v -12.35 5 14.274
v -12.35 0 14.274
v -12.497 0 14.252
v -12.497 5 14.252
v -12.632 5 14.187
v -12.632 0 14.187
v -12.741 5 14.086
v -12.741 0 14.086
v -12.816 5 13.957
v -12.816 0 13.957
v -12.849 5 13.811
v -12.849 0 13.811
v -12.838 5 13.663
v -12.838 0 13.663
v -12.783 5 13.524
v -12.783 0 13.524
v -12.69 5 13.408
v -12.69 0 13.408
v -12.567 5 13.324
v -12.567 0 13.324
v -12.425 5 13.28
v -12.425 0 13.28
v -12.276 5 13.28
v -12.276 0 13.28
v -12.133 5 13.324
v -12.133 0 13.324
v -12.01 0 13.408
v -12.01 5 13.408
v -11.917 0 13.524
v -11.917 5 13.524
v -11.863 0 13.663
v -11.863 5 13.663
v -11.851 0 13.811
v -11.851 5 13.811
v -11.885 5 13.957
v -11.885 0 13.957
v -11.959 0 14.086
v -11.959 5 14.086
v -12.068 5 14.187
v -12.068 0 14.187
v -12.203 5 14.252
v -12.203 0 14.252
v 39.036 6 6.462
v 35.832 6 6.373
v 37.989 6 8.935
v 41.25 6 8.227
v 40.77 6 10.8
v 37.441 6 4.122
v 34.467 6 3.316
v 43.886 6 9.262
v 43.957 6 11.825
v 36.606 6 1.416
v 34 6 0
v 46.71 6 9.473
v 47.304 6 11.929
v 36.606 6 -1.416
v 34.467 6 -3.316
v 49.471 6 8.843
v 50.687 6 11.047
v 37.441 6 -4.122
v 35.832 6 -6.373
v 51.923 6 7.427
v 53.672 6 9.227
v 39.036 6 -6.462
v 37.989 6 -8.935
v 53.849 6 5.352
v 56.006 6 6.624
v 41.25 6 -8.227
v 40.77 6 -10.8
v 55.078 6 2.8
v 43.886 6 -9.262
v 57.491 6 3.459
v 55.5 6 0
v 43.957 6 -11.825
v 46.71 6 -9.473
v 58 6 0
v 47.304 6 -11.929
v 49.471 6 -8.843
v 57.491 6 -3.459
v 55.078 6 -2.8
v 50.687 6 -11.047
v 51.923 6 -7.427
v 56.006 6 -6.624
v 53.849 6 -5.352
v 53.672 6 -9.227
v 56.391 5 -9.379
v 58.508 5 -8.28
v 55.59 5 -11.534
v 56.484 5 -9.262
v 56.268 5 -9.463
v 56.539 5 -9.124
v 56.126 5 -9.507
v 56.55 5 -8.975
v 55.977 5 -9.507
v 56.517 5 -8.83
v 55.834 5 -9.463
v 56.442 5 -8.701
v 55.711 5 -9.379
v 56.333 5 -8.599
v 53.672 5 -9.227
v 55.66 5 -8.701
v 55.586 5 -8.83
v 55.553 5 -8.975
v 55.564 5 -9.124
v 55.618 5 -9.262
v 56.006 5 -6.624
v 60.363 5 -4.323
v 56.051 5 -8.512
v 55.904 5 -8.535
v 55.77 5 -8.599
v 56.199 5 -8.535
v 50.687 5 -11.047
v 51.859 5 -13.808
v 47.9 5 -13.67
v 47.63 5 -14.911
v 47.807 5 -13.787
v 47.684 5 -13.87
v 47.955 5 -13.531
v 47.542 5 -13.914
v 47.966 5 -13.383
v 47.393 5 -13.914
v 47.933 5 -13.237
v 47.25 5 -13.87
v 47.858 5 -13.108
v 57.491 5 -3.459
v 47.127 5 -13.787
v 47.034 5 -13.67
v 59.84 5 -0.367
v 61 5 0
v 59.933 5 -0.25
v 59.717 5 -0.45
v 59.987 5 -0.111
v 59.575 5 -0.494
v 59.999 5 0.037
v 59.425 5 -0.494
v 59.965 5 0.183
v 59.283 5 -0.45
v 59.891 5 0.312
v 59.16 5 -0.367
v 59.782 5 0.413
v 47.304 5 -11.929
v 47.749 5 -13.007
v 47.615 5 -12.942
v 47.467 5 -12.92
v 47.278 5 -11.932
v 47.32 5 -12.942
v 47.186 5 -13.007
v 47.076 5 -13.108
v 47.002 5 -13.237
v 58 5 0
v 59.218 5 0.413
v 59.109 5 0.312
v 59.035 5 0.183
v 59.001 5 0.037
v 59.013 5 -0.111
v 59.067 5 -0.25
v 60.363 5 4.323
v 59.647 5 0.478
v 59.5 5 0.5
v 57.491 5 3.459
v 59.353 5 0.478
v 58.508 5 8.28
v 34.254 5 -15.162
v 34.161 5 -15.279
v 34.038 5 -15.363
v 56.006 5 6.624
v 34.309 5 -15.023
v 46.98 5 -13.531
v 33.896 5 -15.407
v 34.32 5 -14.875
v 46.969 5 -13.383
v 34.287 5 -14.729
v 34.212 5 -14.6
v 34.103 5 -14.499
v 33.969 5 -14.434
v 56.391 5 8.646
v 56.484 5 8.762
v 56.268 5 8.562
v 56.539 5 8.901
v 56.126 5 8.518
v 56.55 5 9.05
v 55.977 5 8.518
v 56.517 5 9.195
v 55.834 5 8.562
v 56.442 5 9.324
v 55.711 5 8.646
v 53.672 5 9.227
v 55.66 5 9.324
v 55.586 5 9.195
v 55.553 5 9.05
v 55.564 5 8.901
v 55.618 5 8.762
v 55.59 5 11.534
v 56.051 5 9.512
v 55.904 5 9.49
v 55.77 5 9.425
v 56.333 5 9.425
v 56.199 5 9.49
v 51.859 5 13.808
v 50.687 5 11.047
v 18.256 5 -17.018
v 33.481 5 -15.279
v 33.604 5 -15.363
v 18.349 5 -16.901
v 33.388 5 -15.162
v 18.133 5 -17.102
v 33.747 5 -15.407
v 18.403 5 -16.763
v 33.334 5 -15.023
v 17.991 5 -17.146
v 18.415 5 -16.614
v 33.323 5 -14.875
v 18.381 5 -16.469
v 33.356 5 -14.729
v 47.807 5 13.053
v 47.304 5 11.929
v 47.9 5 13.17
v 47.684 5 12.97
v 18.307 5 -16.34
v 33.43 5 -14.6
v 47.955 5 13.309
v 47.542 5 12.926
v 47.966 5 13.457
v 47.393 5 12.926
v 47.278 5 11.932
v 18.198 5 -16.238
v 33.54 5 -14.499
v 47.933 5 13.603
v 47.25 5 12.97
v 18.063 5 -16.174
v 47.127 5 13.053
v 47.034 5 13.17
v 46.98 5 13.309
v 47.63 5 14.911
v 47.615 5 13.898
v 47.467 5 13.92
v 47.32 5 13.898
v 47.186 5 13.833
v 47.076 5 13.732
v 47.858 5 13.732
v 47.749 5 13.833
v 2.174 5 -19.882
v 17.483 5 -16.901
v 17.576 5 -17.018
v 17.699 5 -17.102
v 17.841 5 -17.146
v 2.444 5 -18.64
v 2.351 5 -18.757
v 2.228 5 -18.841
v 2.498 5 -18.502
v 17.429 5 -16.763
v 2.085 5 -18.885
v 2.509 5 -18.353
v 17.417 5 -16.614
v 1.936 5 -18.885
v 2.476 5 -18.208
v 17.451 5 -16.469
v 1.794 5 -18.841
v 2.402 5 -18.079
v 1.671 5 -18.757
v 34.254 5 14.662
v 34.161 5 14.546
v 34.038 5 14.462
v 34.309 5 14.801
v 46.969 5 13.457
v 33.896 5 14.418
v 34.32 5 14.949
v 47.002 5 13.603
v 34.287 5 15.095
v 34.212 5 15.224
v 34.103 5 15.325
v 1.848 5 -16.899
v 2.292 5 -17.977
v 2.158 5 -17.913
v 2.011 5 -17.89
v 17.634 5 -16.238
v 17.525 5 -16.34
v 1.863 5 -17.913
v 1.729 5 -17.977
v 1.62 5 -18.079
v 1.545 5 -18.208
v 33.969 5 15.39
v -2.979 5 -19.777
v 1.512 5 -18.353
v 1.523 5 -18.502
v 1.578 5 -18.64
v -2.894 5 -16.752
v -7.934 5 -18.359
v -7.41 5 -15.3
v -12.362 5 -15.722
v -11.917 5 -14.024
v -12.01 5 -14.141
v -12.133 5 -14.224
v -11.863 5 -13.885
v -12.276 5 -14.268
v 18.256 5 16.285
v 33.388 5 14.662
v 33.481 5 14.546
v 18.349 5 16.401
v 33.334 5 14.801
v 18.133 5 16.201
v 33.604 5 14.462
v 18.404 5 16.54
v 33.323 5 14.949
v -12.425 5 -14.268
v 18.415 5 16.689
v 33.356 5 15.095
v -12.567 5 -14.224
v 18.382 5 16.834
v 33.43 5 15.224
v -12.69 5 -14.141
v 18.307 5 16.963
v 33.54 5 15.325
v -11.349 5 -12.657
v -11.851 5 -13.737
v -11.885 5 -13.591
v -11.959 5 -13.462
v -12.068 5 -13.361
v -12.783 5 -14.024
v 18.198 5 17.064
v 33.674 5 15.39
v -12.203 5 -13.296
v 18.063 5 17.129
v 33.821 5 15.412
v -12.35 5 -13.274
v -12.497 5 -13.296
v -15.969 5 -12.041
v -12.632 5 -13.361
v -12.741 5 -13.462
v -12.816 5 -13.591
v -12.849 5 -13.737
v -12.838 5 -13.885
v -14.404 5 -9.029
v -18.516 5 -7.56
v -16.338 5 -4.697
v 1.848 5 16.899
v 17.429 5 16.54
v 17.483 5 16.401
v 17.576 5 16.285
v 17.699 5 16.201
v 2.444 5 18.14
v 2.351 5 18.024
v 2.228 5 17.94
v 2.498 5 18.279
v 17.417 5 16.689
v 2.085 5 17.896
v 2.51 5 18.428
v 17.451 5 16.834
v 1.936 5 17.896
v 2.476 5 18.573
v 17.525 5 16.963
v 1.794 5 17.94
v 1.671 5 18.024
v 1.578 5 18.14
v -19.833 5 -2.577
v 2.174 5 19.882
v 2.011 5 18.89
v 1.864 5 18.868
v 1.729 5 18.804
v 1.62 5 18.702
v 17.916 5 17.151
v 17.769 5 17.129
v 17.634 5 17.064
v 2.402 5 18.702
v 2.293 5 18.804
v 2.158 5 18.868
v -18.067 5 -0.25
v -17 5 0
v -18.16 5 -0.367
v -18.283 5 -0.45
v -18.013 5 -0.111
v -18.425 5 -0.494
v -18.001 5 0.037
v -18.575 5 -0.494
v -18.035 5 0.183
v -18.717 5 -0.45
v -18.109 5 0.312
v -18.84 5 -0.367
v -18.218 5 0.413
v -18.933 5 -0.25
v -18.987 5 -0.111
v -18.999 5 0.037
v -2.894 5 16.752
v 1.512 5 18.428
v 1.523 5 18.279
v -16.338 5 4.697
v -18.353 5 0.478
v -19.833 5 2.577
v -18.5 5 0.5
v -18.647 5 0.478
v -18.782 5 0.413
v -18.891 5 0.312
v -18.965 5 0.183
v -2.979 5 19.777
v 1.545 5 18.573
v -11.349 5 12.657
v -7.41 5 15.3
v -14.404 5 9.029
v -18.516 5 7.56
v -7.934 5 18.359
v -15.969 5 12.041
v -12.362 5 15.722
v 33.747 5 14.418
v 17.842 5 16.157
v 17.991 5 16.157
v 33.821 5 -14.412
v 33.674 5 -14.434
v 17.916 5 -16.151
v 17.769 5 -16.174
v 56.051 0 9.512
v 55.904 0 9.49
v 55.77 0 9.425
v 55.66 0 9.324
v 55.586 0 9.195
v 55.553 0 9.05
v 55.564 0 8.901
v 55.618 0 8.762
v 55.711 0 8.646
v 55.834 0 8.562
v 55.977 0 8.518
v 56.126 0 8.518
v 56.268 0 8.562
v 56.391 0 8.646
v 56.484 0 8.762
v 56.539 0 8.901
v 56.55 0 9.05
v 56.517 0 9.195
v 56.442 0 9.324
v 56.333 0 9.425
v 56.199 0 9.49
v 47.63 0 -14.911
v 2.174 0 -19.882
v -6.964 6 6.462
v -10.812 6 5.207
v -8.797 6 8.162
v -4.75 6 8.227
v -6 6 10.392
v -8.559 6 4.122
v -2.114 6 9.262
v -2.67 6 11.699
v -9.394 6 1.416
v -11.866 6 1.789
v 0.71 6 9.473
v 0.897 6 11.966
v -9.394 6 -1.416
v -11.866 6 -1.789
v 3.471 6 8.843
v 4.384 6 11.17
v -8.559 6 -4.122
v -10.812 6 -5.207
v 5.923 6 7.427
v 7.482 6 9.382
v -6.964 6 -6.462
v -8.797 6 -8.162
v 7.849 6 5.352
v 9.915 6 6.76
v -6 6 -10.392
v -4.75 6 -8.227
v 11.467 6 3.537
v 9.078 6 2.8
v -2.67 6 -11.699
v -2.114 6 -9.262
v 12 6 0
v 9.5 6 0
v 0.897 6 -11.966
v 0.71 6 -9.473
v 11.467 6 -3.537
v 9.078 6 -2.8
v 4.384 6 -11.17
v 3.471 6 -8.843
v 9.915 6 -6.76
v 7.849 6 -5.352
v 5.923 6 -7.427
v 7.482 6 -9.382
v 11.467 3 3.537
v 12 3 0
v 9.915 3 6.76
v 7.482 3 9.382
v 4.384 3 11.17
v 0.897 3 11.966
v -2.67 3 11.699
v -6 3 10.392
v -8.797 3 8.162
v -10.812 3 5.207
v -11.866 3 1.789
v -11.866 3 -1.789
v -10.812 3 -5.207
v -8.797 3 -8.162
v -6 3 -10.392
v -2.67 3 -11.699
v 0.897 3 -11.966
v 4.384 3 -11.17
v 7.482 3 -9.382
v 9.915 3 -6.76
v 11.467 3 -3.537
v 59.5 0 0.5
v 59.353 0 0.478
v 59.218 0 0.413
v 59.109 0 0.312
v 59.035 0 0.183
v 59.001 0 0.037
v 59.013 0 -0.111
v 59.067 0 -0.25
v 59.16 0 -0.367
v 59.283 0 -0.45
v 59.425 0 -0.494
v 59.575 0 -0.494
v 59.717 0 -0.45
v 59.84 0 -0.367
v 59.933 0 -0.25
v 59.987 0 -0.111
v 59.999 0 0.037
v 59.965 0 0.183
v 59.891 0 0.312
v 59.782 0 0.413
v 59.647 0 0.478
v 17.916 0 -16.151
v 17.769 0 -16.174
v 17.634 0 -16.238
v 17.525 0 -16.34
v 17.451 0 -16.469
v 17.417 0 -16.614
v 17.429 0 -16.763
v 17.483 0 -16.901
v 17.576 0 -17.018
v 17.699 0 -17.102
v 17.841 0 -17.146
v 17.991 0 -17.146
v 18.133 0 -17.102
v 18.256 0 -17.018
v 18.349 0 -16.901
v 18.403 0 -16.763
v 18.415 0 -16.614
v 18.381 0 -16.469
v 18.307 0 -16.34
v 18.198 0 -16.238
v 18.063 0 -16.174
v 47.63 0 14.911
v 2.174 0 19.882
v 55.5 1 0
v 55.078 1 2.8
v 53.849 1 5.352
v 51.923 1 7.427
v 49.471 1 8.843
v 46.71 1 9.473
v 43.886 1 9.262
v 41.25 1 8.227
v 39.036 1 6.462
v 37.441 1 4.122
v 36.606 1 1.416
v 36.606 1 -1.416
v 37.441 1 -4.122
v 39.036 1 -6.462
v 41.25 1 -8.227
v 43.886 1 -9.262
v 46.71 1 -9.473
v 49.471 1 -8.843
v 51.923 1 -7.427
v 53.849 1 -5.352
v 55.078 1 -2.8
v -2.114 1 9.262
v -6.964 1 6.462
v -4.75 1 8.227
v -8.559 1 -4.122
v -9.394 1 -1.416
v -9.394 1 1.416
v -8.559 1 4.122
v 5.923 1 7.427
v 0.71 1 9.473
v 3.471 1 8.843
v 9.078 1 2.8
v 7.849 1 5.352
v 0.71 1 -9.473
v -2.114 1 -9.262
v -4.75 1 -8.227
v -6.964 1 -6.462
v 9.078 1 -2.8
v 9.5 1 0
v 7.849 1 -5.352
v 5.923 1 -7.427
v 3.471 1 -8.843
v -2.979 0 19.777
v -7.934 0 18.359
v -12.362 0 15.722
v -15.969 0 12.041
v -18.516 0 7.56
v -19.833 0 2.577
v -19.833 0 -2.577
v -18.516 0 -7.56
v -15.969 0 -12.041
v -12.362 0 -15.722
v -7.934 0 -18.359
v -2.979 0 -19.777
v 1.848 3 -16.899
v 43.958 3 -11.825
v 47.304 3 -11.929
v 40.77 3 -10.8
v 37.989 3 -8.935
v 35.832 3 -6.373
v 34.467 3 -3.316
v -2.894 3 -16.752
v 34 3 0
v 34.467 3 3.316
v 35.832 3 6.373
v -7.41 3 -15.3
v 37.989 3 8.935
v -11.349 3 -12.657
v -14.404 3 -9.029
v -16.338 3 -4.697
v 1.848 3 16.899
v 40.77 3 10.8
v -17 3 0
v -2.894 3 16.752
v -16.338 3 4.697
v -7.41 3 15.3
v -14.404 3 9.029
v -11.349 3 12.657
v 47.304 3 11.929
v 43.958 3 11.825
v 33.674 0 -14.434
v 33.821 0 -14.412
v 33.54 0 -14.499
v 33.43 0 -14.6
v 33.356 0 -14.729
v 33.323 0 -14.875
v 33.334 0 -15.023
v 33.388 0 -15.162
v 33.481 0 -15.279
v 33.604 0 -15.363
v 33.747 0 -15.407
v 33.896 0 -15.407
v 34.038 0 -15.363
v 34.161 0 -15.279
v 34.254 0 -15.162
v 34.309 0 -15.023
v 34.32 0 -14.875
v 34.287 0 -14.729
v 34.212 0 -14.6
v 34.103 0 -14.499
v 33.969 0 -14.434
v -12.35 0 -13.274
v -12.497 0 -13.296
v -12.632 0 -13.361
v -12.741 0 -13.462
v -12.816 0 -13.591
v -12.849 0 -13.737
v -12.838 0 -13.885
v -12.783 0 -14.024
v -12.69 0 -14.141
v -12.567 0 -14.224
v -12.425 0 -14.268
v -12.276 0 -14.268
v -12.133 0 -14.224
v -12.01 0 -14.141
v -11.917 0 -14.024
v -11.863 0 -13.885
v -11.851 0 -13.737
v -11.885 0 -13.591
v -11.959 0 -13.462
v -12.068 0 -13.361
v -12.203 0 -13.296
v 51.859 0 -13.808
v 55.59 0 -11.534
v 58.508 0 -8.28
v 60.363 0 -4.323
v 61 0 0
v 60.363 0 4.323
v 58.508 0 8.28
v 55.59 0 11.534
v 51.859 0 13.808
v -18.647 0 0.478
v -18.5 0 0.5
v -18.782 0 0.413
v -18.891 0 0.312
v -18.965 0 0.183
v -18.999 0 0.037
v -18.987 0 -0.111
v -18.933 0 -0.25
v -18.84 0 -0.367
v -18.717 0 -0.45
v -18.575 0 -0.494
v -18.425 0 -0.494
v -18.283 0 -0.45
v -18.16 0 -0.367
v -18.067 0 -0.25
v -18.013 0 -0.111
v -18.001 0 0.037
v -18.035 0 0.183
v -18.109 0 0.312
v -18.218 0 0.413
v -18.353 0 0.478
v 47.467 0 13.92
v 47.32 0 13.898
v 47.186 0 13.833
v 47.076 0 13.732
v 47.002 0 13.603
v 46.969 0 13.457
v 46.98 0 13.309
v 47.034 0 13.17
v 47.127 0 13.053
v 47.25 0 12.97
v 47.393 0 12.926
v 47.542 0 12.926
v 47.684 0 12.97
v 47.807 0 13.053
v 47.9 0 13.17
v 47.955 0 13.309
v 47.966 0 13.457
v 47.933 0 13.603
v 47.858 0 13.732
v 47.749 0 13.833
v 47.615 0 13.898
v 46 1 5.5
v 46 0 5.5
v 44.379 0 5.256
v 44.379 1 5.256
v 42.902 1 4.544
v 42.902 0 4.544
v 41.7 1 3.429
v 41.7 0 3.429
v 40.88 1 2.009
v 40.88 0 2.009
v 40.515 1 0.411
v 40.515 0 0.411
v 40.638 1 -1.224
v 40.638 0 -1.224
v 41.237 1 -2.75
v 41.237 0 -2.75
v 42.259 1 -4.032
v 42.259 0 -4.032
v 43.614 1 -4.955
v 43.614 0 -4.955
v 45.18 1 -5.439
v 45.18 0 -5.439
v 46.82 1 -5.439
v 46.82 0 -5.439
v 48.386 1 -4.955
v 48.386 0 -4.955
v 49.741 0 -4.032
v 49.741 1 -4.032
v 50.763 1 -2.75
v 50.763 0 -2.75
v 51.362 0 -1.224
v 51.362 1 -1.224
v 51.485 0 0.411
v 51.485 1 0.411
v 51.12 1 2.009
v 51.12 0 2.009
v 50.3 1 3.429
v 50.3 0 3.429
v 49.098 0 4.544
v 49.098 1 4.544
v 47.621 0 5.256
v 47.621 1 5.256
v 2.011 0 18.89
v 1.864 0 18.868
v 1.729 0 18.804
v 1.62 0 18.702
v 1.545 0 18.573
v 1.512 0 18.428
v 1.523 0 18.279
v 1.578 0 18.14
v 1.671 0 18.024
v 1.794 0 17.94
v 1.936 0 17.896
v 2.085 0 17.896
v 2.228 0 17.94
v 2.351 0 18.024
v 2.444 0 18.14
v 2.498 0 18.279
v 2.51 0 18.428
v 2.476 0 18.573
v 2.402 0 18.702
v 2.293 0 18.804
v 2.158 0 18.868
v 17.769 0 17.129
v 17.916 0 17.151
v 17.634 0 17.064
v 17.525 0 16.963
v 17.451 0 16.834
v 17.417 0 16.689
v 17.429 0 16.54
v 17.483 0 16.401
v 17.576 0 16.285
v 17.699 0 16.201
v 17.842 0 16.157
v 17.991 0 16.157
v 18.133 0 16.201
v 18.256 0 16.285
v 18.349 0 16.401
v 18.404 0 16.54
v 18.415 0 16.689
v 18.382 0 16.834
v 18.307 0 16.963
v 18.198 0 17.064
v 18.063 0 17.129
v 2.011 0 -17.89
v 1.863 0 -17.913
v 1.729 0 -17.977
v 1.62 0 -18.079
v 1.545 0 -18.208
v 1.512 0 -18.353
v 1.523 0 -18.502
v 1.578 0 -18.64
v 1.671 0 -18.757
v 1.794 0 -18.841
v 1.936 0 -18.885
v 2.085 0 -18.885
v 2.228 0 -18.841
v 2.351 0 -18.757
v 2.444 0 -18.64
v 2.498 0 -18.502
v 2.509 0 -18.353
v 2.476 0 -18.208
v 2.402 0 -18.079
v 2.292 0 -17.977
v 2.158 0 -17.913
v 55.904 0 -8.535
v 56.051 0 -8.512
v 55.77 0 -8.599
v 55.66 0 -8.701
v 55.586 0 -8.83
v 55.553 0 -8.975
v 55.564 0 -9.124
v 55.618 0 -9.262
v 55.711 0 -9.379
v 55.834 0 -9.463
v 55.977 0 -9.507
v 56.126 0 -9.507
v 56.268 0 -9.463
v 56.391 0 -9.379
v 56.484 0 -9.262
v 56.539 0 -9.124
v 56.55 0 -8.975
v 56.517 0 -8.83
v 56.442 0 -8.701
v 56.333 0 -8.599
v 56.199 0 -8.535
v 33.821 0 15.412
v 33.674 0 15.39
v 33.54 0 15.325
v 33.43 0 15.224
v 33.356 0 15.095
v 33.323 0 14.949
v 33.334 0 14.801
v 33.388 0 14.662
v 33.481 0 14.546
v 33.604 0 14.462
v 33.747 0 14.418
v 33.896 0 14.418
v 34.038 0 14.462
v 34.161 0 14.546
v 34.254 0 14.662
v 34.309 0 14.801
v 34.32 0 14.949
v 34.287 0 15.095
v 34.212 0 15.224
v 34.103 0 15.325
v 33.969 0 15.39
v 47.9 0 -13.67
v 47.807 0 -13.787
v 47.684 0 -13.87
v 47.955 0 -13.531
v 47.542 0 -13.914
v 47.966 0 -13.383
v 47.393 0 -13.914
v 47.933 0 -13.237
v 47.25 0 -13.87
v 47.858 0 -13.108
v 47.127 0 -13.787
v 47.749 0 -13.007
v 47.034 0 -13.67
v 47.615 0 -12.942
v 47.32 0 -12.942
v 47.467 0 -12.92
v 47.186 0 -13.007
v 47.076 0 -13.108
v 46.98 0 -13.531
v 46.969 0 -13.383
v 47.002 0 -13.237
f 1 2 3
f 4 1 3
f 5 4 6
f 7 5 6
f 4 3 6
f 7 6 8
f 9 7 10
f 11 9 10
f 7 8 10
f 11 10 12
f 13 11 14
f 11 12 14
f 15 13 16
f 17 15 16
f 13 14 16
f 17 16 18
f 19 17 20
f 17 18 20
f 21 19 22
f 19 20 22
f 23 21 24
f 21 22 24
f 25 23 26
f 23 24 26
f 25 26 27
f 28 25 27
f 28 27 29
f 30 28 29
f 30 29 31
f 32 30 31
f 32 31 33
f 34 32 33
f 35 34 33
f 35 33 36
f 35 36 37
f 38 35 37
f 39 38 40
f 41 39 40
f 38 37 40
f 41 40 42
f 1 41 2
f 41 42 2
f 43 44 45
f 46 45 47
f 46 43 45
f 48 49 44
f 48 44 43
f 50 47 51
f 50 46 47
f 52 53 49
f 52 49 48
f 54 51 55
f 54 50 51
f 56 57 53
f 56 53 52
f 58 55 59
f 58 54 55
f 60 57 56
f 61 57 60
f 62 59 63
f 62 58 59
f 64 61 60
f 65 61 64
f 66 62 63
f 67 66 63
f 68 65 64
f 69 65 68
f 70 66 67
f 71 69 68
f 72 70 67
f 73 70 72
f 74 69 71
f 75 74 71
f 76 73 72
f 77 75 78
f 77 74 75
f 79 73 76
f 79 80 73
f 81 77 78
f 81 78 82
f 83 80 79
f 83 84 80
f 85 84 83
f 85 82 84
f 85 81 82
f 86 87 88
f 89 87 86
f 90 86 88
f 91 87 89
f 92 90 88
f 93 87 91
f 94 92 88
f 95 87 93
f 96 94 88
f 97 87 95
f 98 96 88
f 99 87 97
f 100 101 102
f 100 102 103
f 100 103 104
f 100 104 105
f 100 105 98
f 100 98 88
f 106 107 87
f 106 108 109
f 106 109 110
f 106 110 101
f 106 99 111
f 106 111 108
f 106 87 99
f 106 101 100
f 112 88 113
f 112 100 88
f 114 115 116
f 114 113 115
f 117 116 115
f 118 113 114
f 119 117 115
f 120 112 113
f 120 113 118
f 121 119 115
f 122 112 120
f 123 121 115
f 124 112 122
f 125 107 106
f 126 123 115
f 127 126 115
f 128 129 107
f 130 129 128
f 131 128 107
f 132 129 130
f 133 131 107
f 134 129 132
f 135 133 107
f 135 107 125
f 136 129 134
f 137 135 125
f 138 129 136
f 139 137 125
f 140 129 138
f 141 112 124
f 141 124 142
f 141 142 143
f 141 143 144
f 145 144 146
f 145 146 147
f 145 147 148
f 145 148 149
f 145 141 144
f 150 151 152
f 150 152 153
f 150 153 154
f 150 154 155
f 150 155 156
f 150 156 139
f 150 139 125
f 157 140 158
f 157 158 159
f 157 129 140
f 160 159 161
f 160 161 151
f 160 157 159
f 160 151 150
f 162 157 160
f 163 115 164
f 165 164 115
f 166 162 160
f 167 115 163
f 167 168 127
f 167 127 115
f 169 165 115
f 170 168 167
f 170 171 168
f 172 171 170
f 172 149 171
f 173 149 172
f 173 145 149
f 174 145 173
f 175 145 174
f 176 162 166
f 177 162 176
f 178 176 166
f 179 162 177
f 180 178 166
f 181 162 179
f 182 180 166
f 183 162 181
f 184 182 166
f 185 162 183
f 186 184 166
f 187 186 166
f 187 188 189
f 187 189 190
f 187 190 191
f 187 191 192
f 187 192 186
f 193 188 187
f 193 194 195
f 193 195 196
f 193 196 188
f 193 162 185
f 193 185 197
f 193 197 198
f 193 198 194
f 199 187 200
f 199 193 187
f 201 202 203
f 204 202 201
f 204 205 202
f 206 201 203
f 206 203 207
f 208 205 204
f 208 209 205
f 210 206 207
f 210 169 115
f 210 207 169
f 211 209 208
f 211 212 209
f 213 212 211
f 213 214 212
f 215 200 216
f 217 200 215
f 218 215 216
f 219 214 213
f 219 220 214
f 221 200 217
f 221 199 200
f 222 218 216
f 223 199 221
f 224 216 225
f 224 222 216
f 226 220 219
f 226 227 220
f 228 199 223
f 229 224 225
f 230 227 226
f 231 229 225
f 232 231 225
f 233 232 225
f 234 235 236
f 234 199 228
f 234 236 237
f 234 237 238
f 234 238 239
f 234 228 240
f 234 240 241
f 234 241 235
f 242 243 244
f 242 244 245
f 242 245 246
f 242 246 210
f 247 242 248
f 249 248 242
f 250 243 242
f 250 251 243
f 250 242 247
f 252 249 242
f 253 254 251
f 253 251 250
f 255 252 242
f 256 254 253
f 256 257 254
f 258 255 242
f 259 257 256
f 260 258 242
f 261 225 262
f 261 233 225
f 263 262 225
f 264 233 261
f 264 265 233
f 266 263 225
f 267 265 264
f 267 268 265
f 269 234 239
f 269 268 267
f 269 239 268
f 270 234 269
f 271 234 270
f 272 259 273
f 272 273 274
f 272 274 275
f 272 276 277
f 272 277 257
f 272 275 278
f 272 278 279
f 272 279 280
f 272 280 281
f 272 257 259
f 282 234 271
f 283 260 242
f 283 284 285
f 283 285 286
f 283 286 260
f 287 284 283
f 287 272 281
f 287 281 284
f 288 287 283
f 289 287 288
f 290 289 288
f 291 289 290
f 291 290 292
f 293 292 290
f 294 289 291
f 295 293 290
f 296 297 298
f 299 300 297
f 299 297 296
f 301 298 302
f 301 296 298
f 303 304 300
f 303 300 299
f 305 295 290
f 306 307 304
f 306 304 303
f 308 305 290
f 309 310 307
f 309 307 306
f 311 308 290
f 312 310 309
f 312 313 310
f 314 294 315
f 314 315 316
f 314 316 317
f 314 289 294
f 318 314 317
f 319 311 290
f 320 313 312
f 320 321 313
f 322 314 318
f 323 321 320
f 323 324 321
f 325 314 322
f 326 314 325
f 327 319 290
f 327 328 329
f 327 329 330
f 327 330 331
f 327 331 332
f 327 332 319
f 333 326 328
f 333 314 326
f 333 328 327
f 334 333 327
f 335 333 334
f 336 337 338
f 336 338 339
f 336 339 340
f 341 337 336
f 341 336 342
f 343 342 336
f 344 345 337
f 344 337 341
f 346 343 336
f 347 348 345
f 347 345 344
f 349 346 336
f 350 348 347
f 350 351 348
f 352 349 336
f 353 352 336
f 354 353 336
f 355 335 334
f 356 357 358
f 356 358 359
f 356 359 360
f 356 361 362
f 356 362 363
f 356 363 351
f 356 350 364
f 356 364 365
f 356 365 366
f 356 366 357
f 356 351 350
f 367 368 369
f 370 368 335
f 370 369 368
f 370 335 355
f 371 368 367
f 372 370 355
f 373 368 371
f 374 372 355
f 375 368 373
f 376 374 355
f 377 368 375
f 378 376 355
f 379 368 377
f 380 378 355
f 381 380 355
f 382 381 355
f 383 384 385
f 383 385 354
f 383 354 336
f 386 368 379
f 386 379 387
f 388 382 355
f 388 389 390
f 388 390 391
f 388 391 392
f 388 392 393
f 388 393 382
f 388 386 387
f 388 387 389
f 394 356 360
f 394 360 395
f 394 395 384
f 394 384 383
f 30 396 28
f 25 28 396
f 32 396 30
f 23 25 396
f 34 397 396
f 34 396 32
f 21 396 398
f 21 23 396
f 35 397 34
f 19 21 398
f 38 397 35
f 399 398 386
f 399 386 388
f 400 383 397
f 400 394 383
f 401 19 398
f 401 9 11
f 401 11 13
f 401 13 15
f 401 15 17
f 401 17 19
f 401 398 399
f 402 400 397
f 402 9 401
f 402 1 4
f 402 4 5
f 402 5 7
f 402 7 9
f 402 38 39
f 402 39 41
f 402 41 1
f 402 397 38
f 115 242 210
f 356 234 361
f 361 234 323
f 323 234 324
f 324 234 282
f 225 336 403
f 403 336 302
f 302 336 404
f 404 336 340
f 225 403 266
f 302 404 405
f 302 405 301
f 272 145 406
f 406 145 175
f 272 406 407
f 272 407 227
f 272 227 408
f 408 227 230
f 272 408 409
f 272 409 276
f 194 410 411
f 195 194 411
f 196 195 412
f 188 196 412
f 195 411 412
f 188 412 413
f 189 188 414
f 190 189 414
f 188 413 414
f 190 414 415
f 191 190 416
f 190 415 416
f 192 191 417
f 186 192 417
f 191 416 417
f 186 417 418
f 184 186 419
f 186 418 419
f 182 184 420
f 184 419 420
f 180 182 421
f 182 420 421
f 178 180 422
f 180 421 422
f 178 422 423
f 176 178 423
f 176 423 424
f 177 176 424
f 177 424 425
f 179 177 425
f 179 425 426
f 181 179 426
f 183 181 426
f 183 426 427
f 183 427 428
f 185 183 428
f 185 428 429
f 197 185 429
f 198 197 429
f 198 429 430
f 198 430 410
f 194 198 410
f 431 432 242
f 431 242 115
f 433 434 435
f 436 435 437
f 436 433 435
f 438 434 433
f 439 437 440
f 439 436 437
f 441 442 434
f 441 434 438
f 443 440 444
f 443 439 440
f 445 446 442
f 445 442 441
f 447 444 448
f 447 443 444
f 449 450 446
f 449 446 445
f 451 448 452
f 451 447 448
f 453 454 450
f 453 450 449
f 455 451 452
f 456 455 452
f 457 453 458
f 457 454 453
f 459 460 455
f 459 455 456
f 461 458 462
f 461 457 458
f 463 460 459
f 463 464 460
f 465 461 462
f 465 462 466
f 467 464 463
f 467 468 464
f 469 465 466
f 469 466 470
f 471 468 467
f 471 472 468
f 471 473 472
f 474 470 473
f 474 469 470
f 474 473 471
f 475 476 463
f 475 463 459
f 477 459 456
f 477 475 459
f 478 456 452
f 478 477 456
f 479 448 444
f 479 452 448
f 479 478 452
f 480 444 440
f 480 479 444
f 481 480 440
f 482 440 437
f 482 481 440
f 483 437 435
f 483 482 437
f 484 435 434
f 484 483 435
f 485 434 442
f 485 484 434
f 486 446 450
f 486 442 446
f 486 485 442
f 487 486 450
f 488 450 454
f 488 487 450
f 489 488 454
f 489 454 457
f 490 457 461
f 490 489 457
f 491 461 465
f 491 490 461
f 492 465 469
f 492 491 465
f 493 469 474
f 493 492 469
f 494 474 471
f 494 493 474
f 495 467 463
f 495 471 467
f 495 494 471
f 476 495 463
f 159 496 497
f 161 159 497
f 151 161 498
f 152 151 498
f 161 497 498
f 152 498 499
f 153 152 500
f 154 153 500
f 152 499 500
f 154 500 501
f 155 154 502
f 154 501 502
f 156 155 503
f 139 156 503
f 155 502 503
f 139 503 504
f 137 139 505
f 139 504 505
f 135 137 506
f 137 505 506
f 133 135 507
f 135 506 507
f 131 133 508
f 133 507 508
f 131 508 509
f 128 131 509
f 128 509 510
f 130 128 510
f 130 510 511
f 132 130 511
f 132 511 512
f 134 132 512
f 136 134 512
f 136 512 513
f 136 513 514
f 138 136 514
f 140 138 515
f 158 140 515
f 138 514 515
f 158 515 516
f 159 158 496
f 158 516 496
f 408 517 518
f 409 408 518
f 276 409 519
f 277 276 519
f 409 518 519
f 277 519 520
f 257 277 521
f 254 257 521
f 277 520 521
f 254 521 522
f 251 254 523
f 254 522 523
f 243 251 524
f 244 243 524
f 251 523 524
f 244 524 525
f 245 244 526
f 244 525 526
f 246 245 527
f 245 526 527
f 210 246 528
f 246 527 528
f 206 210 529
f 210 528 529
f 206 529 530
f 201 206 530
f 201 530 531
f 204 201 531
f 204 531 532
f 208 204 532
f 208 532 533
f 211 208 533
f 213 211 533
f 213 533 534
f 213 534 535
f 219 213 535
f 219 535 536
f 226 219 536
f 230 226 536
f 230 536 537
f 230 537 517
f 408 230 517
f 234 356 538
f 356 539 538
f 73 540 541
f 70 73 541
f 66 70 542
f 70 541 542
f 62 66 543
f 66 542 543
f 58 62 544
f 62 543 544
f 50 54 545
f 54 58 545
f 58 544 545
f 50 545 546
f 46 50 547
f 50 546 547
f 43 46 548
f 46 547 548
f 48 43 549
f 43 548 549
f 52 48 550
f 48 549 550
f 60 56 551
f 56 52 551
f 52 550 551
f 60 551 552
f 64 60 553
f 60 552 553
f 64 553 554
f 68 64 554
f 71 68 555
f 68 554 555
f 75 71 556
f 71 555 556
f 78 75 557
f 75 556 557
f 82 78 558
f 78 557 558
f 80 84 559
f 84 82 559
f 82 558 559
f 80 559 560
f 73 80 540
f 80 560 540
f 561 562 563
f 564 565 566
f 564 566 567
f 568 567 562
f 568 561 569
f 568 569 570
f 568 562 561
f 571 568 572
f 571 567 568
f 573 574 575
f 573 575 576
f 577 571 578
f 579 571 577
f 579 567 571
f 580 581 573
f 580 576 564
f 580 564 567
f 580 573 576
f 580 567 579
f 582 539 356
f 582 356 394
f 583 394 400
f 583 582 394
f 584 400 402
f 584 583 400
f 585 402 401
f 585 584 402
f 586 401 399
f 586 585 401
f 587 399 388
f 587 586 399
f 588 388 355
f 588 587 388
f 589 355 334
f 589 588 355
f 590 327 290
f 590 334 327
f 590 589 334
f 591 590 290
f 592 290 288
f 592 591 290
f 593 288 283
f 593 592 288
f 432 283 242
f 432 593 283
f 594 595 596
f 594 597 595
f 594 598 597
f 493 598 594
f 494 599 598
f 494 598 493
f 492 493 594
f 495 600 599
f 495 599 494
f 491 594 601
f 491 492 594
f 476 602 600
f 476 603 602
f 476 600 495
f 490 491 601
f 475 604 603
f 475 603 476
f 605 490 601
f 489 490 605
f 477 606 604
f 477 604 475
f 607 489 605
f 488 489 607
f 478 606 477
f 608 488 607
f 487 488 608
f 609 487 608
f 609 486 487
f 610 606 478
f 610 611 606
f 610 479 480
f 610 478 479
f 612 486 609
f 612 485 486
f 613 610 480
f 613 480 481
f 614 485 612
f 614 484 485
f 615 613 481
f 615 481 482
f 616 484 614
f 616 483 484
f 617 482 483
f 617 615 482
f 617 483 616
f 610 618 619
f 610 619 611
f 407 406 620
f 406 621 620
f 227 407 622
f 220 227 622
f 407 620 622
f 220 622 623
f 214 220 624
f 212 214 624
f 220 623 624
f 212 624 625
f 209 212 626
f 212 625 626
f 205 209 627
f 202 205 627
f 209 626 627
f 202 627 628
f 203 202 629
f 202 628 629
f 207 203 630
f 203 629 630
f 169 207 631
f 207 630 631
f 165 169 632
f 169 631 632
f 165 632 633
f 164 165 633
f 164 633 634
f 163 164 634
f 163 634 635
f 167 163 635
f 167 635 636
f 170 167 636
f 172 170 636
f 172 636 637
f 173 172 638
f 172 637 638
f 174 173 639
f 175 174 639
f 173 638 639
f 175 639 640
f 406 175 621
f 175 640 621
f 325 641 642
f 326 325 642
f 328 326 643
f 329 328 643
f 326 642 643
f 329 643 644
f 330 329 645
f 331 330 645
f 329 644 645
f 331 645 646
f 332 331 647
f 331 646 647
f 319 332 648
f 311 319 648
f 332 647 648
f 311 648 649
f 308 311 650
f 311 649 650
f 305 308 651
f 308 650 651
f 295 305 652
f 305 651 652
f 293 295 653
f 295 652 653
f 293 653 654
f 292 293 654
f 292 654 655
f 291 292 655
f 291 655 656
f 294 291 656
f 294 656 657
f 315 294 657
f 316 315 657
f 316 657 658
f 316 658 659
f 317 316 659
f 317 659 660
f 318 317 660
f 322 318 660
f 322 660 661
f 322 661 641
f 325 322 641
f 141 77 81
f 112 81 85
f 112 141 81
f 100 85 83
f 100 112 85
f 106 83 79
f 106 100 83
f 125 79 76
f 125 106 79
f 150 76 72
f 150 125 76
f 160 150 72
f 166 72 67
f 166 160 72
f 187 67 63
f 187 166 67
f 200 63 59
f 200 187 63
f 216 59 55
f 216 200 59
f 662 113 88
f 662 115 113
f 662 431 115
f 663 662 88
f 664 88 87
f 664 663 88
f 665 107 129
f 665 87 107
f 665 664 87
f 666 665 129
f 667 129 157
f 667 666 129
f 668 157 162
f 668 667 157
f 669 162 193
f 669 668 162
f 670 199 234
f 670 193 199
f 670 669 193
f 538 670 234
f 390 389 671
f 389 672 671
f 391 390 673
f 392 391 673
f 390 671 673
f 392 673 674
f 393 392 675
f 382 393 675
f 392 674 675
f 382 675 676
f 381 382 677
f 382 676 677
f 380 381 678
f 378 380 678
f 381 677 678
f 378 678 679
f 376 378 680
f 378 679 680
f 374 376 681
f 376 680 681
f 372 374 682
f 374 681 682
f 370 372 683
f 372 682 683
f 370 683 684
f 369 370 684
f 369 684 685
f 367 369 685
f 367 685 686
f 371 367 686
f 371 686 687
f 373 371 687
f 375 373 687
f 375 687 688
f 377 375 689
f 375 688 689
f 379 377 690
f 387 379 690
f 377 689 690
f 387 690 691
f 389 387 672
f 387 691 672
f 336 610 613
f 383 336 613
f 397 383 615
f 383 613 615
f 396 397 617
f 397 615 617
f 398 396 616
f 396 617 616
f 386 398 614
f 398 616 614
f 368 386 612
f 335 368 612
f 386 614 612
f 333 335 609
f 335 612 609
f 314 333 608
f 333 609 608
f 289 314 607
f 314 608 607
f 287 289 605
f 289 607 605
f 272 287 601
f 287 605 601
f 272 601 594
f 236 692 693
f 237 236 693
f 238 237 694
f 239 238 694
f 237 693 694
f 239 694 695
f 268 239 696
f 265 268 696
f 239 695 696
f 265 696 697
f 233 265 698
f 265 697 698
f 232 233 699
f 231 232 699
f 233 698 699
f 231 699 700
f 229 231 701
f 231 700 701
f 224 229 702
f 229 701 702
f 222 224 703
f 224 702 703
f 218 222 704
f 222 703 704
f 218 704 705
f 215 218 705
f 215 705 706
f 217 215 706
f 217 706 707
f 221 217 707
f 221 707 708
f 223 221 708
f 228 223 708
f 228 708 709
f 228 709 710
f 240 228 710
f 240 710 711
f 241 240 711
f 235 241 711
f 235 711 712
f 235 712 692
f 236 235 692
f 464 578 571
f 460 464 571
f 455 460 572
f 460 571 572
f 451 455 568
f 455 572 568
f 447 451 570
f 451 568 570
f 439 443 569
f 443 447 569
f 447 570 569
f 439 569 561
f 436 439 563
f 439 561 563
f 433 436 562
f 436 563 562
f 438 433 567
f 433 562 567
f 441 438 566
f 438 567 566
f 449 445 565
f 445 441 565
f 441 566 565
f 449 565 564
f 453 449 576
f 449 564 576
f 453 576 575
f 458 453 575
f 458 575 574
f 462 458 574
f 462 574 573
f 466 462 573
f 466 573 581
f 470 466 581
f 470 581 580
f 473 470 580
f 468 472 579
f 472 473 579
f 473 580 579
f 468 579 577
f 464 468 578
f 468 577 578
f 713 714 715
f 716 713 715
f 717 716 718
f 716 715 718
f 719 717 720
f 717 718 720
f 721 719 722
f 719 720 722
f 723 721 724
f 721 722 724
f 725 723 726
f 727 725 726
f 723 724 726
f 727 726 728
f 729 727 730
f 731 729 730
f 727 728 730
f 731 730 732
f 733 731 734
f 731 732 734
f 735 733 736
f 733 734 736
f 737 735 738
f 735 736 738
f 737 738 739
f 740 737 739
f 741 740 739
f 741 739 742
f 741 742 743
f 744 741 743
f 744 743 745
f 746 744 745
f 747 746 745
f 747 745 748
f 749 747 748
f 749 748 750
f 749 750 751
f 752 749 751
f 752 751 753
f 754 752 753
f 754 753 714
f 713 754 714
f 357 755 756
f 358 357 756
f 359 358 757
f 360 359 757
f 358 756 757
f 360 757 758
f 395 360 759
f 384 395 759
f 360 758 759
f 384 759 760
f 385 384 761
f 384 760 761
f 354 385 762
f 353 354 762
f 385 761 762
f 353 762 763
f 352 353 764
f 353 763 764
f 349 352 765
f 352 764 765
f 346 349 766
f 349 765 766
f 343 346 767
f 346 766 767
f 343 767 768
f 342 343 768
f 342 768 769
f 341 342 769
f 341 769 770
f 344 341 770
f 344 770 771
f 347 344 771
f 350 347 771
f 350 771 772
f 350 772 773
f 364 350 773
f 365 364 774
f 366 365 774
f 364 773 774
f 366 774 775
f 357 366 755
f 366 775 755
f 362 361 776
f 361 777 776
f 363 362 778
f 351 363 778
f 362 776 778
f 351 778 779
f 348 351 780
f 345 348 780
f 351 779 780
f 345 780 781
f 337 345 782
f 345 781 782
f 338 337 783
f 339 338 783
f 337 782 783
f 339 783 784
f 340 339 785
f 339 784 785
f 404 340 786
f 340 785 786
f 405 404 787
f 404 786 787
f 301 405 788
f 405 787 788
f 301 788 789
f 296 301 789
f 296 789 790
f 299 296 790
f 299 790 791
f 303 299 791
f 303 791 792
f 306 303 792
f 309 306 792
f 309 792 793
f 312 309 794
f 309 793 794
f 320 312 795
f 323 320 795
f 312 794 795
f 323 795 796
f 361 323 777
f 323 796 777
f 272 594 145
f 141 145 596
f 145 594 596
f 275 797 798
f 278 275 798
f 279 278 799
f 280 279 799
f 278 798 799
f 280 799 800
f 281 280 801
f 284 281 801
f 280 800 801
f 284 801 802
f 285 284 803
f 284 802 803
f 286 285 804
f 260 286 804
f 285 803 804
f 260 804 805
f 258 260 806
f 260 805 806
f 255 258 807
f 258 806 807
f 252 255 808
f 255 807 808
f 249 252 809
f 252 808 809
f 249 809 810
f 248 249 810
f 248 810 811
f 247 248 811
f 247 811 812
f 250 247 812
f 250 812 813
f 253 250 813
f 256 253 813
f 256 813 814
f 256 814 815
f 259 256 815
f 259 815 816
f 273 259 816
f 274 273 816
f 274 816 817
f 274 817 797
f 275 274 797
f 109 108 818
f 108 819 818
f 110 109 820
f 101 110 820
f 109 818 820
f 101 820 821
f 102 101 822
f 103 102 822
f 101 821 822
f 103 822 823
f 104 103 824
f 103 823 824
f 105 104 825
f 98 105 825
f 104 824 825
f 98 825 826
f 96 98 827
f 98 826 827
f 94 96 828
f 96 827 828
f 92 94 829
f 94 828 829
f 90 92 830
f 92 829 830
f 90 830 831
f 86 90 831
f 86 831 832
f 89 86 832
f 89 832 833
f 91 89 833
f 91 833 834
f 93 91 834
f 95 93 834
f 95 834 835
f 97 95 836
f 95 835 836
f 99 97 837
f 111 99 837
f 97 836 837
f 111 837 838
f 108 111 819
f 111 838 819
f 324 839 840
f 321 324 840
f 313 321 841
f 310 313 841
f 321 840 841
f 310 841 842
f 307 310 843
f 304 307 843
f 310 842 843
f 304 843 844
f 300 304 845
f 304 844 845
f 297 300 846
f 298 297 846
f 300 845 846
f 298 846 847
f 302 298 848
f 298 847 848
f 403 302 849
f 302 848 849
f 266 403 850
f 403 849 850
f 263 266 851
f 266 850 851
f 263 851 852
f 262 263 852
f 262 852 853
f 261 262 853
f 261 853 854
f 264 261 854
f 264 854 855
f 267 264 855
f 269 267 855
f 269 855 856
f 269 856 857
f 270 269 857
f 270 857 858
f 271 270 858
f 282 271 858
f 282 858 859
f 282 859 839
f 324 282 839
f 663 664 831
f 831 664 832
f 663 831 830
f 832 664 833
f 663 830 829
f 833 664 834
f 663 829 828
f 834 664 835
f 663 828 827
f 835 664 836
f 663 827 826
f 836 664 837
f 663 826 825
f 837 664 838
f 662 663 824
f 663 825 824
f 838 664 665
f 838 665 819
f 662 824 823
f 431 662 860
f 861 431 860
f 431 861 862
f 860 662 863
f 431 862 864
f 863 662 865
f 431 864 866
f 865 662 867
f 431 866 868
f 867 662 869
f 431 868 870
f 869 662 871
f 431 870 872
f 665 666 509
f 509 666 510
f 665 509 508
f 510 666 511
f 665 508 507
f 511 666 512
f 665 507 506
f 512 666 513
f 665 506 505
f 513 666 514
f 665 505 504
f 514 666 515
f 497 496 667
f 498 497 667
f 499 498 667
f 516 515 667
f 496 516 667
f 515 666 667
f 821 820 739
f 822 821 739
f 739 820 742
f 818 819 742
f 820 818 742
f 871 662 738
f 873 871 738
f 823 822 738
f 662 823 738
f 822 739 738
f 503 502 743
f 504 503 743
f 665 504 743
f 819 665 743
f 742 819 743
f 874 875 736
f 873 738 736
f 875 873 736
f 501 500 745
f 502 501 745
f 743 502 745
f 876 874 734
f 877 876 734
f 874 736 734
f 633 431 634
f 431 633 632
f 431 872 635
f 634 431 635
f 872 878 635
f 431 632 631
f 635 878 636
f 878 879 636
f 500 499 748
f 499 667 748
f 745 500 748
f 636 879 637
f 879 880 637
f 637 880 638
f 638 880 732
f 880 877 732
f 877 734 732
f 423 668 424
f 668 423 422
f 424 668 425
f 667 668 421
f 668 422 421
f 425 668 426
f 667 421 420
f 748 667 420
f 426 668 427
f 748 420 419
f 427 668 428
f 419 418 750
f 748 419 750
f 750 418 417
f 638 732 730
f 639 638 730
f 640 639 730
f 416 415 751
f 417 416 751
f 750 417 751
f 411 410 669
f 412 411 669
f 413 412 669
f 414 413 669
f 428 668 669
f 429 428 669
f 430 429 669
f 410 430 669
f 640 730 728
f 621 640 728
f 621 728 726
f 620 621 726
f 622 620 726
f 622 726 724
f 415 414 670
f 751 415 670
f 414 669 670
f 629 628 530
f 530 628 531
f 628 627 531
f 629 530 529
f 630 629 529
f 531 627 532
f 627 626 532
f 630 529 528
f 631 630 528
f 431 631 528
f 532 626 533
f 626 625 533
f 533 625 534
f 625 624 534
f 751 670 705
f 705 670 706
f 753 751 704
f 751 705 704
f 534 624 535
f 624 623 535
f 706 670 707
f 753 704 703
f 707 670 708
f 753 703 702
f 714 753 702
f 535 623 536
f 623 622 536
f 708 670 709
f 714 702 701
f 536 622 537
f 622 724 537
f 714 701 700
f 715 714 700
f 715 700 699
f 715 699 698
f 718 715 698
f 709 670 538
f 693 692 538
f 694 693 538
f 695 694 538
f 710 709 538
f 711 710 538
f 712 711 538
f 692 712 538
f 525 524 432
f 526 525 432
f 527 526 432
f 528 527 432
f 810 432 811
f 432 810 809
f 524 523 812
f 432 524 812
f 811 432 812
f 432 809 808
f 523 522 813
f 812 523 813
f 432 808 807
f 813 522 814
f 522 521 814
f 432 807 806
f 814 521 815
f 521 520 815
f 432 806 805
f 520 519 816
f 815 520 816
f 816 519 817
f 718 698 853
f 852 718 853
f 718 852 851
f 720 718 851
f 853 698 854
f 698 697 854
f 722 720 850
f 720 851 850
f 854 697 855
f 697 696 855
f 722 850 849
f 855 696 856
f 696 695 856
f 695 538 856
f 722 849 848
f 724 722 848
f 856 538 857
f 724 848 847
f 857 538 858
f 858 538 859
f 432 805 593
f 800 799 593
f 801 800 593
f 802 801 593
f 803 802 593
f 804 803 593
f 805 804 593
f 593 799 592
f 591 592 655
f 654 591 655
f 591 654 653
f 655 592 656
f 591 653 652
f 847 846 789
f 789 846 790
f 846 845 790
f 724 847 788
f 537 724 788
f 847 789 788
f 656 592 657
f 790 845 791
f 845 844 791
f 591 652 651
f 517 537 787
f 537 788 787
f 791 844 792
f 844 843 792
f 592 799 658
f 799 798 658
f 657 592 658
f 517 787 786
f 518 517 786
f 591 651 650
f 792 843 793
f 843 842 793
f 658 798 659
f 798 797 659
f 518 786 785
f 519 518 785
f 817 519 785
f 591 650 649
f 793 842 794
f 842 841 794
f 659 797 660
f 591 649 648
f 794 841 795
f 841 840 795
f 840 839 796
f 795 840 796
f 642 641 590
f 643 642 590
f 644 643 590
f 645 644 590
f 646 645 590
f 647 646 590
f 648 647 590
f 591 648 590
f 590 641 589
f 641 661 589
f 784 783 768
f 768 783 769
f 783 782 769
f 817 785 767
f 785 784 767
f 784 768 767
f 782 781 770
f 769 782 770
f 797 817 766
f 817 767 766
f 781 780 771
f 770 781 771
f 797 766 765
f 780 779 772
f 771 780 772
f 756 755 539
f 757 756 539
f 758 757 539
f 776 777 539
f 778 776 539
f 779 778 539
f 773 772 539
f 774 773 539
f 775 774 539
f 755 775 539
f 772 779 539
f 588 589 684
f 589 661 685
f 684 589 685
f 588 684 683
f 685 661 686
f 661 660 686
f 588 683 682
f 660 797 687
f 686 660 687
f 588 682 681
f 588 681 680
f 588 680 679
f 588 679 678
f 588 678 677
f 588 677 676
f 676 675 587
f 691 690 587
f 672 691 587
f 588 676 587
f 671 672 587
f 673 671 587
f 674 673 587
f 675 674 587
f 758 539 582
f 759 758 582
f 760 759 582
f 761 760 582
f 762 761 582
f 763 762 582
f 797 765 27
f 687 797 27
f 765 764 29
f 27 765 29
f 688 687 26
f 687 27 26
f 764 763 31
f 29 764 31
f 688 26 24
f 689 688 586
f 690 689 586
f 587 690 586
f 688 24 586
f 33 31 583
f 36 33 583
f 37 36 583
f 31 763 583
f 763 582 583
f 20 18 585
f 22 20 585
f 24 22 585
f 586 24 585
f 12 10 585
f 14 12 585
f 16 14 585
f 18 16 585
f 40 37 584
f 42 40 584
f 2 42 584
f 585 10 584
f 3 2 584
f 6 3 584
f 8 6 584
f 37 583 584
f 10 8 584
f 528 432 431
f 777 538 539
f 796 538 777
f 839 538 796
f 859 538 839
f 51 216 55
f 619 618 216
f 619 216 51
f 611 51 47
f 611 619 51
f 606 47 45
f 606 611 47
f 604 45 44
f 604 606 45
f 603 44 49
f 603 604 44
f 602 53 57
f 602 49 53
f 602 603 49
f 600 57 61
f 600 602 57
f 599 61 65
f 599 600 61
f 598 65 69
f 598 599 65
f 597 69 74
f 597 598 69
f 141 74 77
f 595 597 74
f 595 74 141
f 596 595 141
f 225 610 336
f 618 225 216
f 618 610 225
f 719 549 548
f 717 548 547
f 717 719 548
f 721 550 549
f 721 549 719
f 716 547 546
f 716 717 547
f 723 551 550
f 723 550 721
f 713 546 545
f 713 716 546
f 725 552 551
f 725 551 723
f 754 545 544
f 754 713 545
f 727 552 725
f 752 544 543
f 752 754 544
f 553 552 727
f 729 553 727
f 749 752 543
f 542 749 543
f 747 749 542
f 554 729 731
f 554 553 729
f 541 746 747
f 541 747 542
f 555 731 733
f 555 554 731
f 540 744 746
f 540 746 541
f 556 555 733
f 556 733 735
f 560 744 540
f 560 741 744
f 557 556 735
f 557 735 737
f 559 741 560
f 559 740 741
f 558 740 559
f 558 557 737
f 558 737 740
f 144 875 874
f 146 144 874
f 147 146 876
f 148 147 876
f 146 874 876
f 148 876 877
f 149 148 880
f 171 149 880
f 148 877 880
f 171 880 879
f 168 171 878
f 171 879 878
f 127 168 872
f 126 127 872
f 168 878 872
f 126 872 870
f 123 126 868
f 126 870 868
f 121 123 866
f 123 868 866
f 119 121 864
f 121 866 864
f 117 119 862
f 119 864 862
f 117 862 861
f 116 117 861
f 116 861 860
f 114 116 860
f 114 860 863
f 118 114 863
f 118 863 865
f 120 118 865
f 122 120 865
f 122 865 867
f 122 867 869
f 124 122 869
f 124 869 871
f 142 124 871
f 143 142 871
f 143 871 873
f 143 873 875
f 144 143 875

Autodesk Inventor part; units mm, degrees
ref_plane "YZ Plane" through (0, 0, 0) normal (1, 0, 0) x (0, 1, 0)
ref_plane "XZ Plane" through (0, 0, 0) normal (0, 1, 0) x (-1, 0, 0)
ref_plane "XY Plane" through (0, 0, 0) normal (0, 0, 1) x (1, 0, 0)
sketch "Skizze7" plane through (0, 0, 0) normal (0, -1, 0) x (1, 0, 0)
  point P0 (-1.8443, 26.478)
sketch "Skizze1" plane through (0, 0, 0) normal (0, 1, 0) x (-1, 0, 0)
  arc A0 (-2.1739, -19.8815) -> (-2.1739, 19.8815) centre (0, 0) ccw
  arc A1 (-47.6304, 14.9111) -> (-47.6304, -14.9111) centre (-46, 0) ccw
  line L0 (-2.1739, 19.8815) -> (-47.6304, 14.9111)
  line L1 (-2.1739, -19.8815) -> (-47.6304, -14.9111)
  line L2 (45.0235, 0) -> (-115.148, 0) construction
  dimension "d0" = 40
  dimension "d1" = 30
  dimension "d2" = 46
extrude "Extrusion1" add sketch "Skizze1" along normal blind 5
shell "Wandung1" thickness 3 removed faces 1 at (17.3261, 5, -4.9704)
sketch "Skizze2" plane through (0, 3, 0) normal (0, 1, 0) x (1, 0, 0)
  circle A0 centre (0, 0) radius 9.5
  circle A1 centre (0, 0) radius 12
  dimension "d6" = 19
  dimension "d7" = 24
extrude "Extrusion2" add sketch "Skizze2" along normal blind 3
sketch "Skizze3" plane through (0, 3, 0) normal (0, 1, 0) x (1, 0, 0)
  arc A0 (47.3043, -11.9289) -> (47.3043, 11.9289) centre (46, 0) ccw projected
  circle A1 centre (46, 0) radius 9.5
  circle A2 centre (46, 0) radius 12
  point P0 (0, 0)
  point P1 (47.3043, -11.9289)
  dimension "d10" = 19
extrude "Extrusion3" add sketch "Skizze3" along normal blind 3
sketch "Skizze4" plane through (0, 3, 0) normal (0, 1, 0) x (1, 0, 0)
  circle A0 centre (0, 0) radius 9.5
extrude "Extrusion4" cut sketch "Skizze4" against normal blind 2
sketch "Skizze5" plane through (46, 3, 0) normal (0, 1, 0) x (1, 0, 0)
  circle A0 centre (0, 0) radius 9.5
  point P0 (-46, 0)
extrude "Extrusion5" cut sketch "Skizze5" against normal blind 2
sketch "Skizze6" plane through (46, 1, 0) normal (0, 1, 0) x (1, 0, 0)
  point P0 (-46, 0)
  point P1 (0, 0)
  point P2 (0, 0)
hole "Bohrung1" at (46, 1, 0) direction (0, -1, 0) diameter 11 end through all
sketch "Skizze8" plane through (0, 5, 0) normal (0, 1, 0) x (1, 0, 0)
  arc A0 (1.8478, 16.8993) -> (1.8478, -16.8993) centre (0, 0) ccw projected
  arc A1 (2.1739, 19.8815) -> (2.1739, -19.8815) centre (0, 0) ccw projected
  line L0 (47.3043, -11.9289) -> (1.8478, -16.8993) projected
  line L1 (2.1739, -19.8815) -> (47.6304, -14.9111) projected
  arc A2 (47.6304, -14.9111) -> (47.6304, 14.9111) centre (46, 0) ccw projected
  circle A3 centre (46, 0) radius 12 projected
  line L2 (1.8478, 16.8993) -> (47.3043, 11.9289) projected
  line L3 (47.6304, 14.9111) -> (2.1739, 19.8815) projected
  arc A4 (2.0109, 18.3904) -> (2.0109, -18.3904) centre (0, 0) ccw
  line L4 (2.0109, 18.3904) -> (47.4674, 13.42)
  arc A5 (47.4674, -13.42) -> (47.4674, 13.42) centre (46, 0) ccw
  line L5 (47.4674, -13.42) -> (2.0109, -18.3904)
  line L6 (47.4674, 13.42) -> (46, 0) construction
  line L7 (46, 0) -> (47.4674, -13.42) construction
  line L8 (0, 0) -> (2.0109, -18.3904) construction
  line L9 (0, 0) -> (2.0109, 18.3904) construction
  point P0 (0, -18.5)
  point P1 (56.0514, -9.0122)
  point P2 (59.5, 0)
  point P3 (56.0513, 9.0123)
  point P4 (47.4673, 13.42)
  point P5 (-12.3501, -13.7741)
  point P6 (-18.5, 0)
  point P7 (-12.3501, 13.774)
  point P8 (2.0108, 18.3904)
  point P9 (17.9161, -16.6513)
  point P10 (33.8213, -14.9121)
  point P11 (17.9161, 16.6513)
  point P12 (17.916, 16.6513)
  point P13 (33.8213, 14.9121)
  point P14 (33.8212, 14.9121)
  dimension "d24" = 1.5
  dimension "d26" = 167.52
  dimension "d29" = 167.52
  dimension "d31" = 167.52
  dimension "d34" = 192.48
  dimension "d38" = 16
  dimension "d45" = 16
hole "Bohrung2" at (2.0109, 5, 18.3904) at (-12.3501, 5, 13.7741) at (-18.5, 5, 0) at (-12.3501, 5, -13.774) at (2.0108, 5, -18.3904) at (17.916, 5, -16.6513) at (33.8213, 5, -14.9121) at (47.4673, 5, -13.42) at (56.0513, 5, -9.0123) at (59.5, 5, 0) at (56.0514, 5, 9.0122) at (47.4674, 5, 13.42) at (33.8213, 5, 14.9121) at (17.9161, 5, 16.6513) direction (0, -1, 0) diameter 1 end through all
properties part number "Klapp_Hinten_Abdeckung"
